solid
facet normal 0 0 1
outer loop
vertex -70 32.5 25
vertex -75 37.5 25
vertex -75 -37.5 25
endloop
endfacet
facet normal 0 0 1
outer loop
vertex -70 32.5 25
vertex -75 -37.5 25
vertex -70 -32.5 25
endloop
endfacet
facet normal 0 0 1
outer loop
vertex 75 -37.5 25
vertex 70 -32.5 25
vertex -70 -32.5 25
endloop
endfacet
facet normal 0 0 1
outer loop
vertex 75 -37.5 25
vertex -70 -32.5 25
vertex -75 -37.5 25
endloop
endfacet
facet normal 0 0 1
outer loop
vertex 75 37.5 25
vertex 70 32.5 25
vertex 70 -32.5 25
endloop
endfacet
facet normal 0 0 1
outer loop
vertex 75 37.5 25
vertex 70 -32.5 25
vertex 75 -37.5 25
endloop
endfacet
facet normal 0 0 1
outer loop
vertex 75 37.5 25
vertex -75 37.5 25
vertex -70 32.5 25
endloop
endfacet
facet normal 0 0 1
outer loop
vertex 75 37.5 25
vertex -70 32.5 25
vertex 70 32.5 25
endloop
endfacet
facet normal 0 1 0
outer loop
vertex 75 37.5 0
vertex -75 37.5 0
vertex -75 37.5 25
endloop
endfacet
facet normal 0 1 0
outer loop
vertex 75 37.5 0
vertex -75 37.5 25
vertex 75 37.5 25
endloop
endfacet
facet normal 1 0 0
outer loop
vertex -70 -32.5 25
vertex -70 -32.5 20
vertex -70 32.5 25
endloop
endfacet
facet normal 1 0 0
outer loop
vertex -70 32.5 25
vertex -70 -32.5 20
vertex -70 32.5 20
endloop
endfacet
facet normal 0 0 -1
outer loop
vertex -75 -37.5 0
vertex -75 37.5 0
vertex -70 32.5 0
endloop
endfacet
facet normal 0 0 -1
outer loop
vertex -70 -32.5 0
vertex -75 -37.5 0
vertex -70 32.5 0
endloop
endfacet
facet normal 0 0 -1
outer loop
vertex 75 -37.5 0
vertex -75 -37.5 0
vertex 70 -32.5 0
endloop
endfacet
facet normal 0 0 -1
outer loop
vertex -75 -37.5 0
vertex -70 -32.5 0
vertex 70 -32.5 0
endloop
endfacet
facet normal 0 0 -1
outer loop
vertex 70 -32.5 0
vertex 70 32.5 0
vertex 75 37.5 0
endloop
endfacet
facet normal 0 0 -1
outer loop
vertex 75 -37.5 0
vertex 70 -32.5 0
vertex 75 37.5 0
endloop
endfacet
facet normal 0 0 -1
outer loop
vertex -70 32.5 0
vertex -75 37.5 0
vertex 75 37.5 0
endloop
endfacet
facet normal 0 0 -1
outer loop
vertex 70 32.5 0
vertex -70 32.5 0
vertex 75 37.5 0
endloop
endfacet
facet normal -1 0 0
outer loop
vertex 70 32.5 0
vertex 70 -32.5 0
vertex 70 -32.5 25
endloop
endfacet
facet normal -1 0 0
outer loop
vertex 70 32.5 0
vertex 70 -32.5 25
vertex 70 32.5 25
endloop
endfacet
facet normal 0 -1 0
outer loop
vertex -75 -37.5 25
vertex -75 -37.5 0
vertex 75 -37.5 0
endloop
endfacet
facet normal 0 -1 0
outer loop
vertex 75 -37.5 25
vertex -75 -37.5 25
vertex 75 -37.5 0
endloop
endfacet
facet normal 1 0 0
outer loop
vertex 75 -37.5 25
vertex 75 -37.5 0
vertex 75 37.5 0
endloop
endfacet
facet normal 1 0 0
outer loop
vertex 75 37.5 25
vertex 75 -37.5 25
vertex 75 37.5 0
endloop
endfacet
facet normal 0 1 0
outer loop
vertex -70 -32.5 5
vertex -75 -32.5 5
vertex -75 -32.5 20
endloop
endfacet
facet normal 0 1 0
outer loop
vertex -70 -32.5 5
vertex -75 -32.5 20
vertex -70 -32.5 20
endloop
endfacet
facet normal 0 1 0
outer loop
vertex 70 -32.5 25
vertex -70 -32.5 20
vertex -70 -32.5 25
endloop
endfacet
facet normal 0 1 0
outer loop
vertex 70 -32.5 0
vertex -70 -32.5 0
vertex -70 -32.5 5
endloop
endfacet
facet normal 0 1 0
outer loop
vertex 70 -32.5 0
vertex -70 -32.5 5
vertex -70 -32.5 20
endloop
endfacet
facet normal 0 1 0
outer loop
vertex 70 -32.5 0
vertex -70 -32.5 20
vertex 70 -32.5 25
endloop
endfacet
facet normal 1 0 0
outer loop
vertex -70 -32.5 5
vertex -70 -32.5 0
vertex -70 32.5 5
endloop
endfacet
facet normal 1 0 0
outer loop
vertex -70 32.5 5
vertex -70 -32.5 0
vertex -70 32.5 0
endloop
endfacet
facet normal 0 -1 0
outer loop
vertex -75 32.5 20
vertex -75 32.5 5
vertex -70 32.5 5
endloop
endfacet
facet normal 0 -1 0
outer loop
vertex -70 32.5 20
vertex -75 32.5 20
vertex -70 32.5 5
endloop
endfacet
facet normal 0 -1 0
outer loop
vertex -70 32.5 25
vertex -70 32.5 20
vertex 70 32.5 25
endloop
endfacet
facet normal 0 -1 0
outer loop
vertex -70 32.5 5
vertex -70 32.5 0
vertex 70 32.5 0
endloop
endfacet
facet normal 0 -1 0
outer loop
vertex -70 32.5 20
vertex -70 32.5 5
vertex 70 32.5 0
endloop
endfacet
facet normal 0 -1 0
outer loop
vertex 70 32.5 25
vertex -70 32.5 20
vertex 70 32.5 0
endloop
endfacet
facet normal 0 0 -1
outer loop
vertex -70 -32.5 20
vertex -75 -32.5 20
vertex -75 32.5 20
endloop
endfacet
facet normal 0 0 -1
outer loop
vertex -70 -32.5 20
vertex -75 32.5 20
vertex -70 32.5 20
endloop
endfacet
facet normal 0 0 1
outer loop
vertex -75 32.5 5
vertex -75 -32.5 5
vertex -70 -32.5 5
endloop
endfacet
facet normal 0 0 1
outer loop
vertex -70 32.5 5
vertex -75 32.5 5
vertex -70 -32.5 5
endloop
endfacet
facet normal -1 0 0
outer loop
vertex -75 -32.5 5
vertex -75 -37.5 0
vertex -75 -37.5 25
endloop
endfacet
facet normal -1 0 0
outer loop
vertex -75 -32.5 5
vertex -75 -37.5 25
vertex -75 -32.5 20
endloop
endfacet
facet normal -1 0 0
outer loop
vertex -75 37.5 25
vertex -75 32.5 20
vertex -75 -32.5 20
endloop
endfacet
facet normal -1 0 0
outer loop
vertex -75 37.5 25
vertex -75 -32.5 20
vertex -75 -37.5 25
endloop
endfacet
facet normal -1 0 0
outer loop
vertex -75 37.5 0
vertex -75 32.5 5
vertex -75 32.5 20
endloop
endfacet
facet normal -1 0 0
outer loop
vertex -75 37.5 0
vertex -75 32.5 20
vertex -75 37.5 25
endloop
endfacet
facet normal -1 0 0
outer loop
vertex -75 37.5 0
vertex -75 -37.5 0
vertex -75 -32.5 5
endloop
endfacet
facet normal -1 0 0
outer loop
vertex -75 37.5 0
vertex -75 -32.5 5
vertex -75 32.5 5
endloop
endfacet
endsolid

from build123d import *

# Parameters (mm, degrees)
F0_W     = 150
F0_H     = 75
F1_DEPTH = 25
F2_T     = -5
F3_W     = 140
F3_H     = 65
F4_DEPTH = 25.001


with BuildPart() as f1:
    # F0 (on Top) → F1 (new body)
    with BuildSketch(Plane.XY):
        Rectangle(F0_W, F0_H)
    extrude(amount=F1_DEPTH)

    # F2
    f2_openings = [f1.faces().sort_by_distance(p)[0] for p in [
        (-75, 0, 12.5),
    ]]
    offset(amount=F2_T, openings=f2_openings)

    # F3 (on Top) → F4 (cut, through all)
    with BuildSketch(Plane.XY):
        Rectangle(F3_W, F3_H)
    extrude(amount=F4_DEPTH, mode=Mode.SUBTRACT)


solid = f1.part
